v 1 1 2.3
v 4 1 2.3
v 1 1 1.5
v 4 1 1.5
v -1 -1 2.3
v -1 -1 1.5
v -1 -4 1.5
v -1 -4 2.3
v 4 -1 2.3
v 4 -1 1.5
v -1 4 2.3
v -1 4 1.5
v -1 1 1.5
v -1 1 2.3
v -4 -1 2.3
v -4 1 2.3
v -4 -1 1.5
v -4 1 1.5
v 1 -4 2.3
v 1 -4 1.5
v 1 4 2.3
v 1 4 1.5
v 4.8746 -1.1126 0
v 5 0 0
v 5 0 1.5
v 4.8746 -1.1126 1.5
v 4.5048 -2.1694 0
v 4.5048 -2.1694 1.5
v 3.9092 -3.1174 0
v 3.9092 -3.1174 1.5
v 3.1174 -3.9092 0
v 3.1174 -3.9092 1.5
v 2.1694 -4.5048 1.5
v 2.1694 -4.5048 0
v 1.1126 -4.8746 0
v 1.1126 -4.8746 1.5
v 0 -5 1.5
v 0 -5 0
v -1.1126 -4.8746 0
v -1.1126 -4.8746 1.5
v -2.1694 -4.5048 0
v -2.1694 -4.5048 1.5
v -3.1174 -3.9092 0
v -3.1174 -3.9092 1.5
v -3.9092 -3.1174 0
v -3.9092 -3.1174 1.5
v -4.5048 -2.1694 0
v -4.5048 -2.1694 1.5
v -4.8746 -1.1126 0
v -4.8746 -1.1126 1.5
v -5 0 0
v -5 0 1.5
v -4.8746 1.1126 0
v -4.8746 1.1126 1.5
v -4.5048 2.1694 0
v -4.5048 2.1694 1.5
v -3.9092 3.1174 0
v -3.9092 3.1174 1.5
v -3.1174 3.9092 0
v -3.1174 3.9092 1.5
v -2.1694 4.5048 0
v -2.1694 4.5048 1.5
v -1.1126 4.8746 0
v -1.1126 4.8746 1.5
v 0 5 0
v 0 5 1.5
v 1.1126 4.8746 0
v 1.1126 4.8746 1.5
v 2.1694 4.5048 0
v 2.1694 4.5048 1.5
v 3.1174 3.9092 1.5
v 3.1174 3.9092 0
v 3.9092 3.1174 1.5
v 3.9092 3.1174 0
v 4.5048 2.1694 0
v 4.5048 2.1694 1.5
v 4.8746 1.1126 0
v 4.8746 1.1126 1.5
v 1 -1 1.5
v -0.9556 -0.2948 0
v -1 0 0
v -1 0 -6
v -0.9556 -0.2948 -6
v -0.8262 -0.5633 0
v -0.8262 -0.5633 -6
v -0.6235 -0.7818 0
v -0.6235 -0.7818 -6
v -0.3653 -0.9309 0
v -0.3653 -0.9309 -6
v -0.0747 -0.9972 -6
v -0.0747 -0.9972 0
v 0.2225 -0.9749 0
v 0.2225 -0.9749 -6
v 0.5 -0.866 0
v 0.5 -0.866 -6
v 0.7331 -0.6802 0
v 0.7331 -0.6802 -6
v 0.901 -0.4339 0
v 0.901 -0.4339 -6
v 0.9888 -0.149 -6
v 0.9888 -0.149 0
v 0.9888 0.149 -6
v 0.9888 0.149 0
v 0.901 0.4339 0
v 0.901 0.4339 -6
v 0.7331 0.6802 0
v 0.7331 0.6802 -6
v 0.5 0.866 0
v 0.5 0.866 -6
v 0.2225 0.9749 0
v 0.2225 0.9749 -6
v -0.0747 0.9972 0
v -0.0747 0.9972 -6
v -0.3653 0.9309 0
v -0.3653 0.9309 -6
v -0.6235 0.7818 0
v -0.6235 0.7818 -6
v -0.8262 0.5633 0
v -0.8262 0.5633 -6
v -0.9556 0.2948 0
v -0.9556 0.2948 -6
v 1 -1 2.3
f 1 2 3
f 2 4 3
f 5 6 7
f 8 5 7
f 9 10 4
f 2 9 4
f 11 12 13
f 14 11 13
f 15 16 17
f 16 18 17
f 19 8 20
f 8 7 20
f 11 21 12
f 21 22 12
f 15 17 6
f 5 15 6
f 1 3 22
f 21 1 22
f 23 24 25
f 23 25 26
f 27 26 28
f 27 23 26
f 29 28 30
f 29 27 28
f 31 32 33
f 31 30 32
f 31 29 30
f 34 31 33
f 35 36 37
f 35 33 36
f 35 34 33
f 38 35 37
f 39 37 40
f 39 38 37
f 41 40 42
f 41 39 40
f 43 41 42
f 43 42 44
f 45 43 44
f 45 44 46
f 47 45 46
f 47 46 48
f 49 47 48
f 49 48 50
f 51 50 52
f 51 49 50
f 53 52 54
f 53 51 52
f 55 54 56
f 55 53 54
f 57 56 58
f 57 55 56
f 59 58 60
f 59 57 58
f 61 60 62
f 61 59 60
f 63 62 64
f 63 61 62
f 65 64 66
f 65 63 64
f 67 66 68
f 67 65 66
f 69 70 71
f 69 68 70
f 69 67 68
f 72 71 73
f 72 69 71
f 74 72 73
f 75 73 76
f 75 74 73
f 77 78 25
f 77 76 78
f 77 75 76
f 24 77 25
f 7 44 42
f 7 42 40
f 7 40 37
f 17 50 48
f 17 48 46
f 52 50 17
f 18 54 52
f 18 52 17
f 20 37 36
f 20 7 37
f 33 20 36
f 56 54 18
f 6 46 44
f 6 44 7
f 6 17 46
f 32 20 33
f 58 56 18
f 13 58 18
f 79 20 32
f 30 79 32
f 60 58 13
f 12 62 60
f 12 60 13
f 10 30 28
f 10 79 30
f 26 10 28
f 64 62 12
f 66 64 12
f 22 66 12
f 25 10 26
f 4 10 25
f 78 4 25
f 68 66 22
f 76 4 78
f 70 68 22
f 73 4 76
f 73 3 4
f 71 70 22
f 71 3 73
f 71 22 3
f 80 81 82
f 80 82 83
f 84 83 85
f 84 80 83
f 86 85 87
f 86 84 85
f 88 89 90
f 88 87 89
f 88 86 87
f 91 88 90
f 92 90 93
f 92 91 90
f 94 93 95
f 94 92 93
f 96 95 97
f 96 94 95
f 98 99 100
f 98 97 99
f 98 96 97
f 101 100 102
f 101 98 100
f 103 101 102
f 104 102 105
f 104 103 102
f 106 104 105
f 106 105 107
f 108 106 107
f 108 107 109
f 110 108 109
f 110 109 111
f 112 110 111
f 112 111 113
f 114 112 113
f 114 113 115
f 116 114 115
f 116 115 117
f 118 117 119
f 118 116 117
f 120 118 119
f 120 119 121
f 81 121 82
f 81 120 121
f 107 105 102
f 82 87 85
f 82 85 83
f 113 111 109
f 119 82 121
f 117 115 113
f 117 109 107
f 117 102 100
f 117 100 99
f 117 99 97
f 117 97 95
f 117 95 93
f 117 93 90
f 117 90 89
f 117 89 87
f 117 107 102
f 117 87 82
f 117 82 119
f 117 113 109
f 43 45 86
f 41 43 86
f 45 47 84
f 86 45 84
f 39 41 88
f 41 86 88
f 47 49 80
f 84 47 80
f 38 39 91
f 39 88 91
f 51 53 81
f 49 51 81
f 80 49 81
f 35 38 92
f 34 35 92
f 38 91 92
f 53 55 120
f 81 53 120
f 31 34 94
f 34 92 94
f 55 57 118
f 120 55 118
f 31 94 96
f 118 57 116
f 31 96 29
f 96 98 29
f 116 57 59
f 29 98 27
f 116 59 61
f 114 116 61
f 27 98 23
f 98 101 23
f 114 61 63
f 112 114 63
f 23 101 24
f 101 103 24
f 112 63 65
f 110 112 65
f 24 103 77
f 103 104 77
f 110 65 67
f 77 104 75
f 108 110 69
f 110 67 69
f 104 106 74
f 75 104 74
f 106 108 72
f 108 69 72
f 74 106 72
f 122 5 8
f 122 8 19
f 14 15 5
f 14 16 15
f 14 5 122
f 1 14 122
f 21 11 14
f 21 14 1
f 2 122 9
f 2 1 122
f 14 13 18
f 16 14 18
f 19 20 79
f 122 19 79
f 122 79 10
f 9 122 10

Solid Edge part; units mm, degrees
sketch "Sketch1" plane through (0, 0, 0) normal (0, 0, 1) x (1, 0, 0)
  circle A0 centre (0, 0) radius 5
extrude "Protrusion1" add sketch "Sketch1" along normal blind 1.5
sketch "Sketch2" plane through (0, 0, 0) normal (0, 0, 1) x (1, 0, 0)
  line L0 (-1, 4) -> (-1, -4)
  line L1 (-1, -4) -> (1, -4)
  line L2 (1, -4) -> (1, 4)
  line L3 (1, 4) -> (-1, 4)
extrude "Protrusão_Extrudada_2" add sketch "Sketch2" along normal blind 2.3
sketch "Sketch3" plane through (0, 0, 0) normal (0, 0, 1) x (1, 0, 0)
  line L0 (-4, -1) -> (4, -1)
  line L1 (4, -1) -> (4, 1)
  line L2 (4, 1) -> (-4, 1)
  line L3 (-4, 1) -> (-4, -1)
extrude "Protrusão_Extrudada_3" add sketch "Sketch3" along normal blind 2.3
sketch "Sketch4" plane through (0, 0, 0) normal (0, 0, -1) x (-1, 0, 0)
  circle A0 centre (0, 0) radius 1
extrude "Protrusão_Extrudada_4" add sketch "Sketch4" along normal blind 6
